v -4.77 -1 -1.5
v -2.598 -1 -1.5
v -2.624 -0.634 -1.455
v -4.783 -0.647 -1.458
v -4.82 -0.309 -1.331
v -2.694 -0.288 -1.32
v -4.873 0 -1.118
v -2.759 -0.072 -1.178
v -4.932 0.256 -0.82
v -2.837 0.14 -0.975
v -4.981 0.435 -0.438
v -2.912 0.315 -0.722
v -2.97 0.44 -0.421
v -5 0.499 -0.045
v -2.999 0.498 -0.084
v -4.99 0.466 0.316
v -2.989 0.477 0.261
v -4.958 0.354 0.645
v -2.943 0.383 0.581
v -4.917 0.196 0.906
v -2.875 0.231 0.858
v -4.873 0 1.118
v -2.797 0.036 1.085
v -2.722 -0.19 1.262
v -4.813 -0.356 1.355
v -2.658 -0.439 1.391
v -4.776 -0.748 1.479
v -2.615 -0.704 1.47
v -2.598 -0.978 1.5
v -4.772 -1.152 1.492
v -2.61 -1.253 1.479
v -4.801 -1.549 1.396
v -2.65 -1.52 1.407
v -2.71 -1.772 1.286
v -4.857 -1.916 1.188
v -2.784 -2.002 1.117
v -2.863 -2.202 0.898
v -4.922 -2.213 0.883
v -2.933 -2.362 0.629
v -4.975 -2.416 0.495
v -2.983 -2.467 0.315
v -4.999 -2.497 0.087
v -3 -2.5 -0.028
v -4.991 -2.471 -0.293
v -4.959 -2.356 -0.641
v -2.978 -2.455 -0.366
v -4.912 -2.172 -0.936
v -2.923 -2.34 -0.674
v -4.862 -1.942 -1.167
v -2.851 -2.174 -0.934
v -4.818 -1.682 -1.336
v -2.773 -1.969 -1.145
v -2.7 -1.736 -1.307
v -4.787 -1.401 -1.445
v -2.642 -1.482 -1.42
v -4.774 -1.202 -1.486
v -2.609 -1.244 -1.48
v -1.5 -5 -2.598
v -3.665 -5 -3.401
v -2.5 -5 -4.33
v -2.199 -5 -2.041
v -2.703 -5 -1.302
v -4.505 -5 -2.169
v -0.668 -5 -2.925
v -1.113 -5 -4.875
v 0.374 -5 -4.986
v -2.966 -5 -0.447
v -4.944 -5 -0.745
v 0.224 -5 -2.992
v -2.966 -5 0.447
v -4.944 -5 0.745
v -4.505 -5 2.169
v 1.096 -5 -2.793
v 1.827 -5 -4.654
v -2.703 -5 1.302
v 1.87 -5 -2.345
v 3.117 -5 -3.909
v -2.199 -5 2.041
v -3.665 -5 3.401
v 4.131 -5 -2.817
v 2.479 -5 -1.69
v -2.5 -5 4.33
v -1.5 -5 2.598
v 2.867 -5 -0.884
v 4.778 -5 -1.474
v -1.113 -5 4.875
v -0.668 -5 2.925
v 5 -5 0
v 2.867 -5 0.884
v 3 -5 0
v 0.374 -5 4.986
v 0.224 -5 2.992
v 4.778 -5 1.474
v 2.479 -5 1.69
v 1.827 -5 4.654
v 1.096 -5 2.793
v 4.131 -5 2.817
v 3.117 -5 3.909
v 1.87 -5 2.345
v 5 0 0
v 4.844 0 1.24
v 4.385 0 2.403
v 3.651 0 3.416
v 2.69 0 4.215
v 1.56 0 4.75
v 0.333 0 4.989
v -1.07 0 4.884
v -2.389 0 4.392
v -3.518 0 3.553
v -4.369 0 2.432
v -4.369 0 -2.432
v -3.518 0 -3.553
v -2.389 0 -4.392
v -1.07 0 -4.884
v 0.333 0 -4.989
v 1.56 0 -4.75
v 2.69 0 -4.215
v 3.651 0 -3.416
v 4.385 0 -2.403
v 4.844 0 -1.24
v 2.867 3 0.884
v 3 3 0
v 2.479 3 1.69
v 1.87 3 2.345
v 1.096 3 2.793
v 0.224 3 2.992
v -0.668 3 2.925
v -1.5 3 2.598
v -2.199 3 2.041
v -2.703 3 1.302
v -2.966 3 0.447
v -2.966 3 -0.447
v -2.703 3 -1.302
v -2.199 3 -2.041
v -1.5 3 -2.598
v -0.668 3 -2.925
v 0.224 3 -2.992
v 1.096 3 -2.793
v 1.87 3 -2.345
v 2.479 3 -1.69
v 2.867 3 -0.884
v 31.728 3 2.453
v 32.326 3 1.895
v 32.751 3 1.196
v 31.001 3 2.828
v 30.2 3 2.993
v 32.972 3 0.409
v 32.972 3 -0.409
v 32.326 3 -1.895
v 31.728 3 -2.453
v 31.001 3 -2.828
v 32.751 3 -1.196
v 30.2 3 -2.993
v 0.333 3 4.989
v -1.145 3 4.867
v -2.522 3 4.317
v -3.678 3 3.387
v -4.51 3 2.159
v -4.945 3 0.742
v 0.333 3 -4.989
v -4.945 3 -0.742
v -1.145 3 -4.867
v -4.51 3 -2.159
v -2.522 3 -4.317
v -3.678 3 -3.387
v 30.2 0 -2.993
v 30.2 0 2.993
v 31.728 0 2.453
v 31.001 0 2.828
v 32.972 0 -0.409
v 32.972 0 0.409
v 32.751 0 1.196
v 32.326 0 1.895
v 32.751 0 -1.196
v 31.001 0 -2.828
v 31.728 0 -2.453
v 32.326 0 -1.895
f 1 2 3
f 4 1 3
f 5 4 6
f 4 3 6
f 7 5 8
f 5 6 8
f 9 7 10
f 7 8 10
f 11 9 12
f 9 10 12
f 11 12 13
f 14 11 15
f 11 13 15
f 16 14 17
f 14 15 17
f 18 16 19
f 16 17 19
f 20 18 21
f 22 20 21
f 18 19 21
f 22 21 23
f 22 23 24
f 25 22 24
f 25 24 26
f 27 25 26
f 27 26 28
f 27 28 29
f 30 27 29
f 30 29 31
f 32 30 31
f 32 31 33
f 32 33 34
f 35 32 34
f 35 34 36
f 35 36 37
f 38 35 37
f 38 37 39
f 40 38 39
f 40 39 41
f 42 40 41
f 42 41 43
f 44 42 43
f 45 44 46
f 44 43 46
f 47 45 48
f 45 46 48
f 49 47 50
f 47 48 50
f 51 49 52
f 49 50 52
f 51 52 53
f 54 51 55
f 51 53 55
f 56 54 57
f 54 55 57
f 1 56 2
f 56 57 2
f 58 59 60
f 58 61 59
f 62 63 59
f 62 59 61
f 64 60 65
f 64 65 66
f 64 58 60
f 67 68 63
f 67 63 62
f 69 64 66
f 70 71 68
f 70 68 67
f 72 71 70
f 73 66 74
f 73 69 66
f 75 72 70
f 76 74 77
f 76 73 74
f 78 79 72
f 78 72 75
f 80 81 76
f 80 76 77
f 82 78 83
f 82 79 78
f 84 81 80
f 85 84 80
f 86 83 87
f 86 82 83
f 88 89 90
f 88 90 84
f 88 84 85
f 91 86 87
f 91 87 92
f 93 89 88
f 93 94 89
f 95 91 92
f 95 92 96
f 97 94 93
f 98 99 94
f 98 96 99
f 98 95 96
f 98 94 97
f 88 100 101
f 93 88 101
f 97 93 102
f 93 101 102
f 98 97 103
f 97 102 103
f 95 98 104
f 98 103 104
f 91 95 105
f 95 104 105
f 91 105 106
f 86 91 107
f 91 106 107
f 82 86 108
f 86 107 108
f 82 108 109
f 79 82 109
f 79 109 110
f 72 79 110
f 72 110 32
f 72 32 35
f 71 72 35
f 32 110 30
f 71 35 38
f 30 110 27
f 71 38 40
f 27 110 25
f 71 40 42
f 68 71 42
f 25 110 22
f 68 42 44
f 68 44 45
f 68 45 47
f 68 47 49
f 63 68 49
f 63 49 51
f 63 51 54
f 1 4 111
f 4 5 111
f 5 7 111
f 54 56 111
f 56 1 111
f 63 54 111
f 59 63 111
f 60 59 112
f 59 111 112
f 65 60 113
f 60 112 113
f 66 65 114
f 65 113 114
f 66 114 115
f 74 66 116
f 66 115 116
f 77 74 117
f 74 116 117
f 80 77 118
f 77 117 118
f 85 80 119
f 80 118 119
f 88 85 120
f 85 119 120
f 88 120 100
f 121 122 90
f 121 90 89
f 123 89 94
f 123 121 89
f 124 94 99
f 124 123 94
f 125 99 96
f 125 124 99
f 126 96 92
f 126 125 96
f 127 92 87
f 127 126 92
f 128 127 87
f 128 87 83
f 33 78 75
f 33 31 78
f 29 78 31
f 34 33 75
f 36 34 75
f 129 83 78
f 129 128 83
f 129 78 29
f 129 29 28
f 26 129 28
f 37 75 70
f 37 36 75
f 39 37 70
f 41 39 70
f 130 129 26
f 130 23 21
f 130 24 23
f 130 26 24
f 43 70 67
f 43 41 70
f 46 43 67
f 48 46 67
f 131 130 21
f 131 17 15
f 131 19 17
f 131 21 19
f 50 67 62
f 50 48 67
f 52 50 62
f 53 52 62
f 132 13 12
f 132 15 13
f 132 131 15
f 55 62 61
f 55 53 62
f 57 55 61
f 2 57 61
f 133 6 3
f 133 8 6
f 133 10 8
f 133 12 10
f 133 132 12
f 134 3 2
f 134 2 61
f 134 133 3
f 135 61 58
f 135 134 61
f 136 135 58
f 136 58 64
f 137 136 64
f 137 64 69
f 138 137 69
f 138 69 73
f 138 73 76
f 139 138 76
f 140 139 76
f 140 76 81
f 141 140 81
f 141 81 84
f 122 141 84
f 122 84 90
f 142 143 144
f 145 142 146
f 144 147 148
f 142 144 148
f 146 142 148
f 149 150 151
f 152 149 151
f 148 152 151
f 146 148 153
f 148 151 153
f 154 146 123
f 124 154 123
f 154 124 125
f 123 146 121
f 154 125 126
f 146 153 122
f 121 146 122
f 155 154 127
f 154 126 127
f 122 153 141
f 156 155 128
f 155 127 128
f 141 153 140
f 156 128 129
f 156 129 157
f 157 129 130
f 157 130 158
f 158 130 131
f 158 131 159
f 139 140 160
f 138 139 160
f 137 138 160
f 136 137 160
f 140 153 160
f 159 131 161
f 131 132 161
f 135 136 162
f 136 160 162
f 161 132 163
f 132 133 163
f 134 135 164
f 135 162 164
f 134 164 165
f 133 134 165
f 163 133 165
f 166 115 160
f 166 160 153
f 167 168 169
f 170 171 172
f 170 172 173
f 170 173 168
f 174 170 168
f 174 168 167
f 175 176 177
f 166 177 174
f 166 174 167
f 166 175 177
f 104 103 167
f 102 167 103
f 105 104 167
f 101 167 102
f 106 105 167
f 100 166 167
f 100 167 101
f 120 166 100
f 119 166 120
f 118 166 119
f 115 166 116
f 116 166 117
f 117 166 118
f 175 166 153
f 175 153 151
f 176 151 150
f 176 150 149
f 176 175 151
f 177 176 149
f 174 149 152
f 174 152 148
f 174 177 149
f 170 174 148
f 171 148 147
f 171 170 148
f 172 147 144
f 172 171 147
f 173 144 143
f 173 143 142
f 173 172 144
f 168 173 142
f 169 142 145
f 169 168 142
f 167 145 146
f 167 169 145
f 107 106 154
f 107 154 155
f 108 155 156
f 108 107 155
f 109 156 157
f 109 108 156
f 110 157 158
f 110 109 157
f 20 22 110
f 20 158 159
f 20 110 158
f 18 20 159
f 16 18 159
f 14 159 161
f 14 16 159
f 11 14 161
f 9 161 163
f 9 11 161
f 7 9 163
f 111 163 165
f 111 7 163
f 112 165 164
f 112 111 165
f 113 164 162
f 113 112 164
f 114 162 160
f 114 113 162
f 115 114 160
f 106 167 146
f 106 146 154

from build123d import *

# Parameters (mm, degrees)
SKETCH_1_R          = 3
EXTRUDE_1_DEPTH     = 3
SKETCH_2_R          = 5
SKETCH_2_R_2        = 3
EXTRUDE_2_DEPTH     = 5
SKETCH_3_R          = 1.5
CUT_EXTRUDE_1_DEPTH = 6


with BuildPart() as part:
    # 草圖1 → 填料-伸長1 (new body)
    with BuildSketch(Plane(origin=(0, 0, 0), x_dir=(1, 0, 0), z_dir=(0, 1, 0))):
        with BuildLine():
            Line((0.333333333, 4.988876516), (30.2, 2.993325909))
            ThreePointArc((30.2, 2.993325909), (33, 0), (30.2, -2.993325909))
            Line((30.2, -2.993325909), (0.333333333, -4.988876516))
            ThreePointArc((0.333333333, -4.988876516), (-5, 0), (0.333333333, 4.988876516))
        make_face()
        Circle(SKETCH_1_R, mode=Mode.SUBTRACT)
    extrude(amount=EXTRUDE_1_DEPTH)

    # 草圖2 → 填料-伸長2 (add)
    with BuildSketch(Plane.XZ):
        Circle(SKETCH_2_R)
        Circle(SKETCH_2_R_2, mode=Mode.SUBTRACT)
    extrude(amount=EXTRUDE_2_DEPTH)

    # 草圖3 → 除料-伸長1 (cut, through all)
    with BuildSketch(Plane(origin=(0, 0, 0), x_dir=(0, 0, -1), z_dir=(1, 0, 0))):
        with Locations((0, -1)):
            Circle(SKETCH_3_R)
    extrude(amount=-CUT_EXTRUDE_1_DEPTH, mode=Mode.SUBTRACT)


solid = part.part
